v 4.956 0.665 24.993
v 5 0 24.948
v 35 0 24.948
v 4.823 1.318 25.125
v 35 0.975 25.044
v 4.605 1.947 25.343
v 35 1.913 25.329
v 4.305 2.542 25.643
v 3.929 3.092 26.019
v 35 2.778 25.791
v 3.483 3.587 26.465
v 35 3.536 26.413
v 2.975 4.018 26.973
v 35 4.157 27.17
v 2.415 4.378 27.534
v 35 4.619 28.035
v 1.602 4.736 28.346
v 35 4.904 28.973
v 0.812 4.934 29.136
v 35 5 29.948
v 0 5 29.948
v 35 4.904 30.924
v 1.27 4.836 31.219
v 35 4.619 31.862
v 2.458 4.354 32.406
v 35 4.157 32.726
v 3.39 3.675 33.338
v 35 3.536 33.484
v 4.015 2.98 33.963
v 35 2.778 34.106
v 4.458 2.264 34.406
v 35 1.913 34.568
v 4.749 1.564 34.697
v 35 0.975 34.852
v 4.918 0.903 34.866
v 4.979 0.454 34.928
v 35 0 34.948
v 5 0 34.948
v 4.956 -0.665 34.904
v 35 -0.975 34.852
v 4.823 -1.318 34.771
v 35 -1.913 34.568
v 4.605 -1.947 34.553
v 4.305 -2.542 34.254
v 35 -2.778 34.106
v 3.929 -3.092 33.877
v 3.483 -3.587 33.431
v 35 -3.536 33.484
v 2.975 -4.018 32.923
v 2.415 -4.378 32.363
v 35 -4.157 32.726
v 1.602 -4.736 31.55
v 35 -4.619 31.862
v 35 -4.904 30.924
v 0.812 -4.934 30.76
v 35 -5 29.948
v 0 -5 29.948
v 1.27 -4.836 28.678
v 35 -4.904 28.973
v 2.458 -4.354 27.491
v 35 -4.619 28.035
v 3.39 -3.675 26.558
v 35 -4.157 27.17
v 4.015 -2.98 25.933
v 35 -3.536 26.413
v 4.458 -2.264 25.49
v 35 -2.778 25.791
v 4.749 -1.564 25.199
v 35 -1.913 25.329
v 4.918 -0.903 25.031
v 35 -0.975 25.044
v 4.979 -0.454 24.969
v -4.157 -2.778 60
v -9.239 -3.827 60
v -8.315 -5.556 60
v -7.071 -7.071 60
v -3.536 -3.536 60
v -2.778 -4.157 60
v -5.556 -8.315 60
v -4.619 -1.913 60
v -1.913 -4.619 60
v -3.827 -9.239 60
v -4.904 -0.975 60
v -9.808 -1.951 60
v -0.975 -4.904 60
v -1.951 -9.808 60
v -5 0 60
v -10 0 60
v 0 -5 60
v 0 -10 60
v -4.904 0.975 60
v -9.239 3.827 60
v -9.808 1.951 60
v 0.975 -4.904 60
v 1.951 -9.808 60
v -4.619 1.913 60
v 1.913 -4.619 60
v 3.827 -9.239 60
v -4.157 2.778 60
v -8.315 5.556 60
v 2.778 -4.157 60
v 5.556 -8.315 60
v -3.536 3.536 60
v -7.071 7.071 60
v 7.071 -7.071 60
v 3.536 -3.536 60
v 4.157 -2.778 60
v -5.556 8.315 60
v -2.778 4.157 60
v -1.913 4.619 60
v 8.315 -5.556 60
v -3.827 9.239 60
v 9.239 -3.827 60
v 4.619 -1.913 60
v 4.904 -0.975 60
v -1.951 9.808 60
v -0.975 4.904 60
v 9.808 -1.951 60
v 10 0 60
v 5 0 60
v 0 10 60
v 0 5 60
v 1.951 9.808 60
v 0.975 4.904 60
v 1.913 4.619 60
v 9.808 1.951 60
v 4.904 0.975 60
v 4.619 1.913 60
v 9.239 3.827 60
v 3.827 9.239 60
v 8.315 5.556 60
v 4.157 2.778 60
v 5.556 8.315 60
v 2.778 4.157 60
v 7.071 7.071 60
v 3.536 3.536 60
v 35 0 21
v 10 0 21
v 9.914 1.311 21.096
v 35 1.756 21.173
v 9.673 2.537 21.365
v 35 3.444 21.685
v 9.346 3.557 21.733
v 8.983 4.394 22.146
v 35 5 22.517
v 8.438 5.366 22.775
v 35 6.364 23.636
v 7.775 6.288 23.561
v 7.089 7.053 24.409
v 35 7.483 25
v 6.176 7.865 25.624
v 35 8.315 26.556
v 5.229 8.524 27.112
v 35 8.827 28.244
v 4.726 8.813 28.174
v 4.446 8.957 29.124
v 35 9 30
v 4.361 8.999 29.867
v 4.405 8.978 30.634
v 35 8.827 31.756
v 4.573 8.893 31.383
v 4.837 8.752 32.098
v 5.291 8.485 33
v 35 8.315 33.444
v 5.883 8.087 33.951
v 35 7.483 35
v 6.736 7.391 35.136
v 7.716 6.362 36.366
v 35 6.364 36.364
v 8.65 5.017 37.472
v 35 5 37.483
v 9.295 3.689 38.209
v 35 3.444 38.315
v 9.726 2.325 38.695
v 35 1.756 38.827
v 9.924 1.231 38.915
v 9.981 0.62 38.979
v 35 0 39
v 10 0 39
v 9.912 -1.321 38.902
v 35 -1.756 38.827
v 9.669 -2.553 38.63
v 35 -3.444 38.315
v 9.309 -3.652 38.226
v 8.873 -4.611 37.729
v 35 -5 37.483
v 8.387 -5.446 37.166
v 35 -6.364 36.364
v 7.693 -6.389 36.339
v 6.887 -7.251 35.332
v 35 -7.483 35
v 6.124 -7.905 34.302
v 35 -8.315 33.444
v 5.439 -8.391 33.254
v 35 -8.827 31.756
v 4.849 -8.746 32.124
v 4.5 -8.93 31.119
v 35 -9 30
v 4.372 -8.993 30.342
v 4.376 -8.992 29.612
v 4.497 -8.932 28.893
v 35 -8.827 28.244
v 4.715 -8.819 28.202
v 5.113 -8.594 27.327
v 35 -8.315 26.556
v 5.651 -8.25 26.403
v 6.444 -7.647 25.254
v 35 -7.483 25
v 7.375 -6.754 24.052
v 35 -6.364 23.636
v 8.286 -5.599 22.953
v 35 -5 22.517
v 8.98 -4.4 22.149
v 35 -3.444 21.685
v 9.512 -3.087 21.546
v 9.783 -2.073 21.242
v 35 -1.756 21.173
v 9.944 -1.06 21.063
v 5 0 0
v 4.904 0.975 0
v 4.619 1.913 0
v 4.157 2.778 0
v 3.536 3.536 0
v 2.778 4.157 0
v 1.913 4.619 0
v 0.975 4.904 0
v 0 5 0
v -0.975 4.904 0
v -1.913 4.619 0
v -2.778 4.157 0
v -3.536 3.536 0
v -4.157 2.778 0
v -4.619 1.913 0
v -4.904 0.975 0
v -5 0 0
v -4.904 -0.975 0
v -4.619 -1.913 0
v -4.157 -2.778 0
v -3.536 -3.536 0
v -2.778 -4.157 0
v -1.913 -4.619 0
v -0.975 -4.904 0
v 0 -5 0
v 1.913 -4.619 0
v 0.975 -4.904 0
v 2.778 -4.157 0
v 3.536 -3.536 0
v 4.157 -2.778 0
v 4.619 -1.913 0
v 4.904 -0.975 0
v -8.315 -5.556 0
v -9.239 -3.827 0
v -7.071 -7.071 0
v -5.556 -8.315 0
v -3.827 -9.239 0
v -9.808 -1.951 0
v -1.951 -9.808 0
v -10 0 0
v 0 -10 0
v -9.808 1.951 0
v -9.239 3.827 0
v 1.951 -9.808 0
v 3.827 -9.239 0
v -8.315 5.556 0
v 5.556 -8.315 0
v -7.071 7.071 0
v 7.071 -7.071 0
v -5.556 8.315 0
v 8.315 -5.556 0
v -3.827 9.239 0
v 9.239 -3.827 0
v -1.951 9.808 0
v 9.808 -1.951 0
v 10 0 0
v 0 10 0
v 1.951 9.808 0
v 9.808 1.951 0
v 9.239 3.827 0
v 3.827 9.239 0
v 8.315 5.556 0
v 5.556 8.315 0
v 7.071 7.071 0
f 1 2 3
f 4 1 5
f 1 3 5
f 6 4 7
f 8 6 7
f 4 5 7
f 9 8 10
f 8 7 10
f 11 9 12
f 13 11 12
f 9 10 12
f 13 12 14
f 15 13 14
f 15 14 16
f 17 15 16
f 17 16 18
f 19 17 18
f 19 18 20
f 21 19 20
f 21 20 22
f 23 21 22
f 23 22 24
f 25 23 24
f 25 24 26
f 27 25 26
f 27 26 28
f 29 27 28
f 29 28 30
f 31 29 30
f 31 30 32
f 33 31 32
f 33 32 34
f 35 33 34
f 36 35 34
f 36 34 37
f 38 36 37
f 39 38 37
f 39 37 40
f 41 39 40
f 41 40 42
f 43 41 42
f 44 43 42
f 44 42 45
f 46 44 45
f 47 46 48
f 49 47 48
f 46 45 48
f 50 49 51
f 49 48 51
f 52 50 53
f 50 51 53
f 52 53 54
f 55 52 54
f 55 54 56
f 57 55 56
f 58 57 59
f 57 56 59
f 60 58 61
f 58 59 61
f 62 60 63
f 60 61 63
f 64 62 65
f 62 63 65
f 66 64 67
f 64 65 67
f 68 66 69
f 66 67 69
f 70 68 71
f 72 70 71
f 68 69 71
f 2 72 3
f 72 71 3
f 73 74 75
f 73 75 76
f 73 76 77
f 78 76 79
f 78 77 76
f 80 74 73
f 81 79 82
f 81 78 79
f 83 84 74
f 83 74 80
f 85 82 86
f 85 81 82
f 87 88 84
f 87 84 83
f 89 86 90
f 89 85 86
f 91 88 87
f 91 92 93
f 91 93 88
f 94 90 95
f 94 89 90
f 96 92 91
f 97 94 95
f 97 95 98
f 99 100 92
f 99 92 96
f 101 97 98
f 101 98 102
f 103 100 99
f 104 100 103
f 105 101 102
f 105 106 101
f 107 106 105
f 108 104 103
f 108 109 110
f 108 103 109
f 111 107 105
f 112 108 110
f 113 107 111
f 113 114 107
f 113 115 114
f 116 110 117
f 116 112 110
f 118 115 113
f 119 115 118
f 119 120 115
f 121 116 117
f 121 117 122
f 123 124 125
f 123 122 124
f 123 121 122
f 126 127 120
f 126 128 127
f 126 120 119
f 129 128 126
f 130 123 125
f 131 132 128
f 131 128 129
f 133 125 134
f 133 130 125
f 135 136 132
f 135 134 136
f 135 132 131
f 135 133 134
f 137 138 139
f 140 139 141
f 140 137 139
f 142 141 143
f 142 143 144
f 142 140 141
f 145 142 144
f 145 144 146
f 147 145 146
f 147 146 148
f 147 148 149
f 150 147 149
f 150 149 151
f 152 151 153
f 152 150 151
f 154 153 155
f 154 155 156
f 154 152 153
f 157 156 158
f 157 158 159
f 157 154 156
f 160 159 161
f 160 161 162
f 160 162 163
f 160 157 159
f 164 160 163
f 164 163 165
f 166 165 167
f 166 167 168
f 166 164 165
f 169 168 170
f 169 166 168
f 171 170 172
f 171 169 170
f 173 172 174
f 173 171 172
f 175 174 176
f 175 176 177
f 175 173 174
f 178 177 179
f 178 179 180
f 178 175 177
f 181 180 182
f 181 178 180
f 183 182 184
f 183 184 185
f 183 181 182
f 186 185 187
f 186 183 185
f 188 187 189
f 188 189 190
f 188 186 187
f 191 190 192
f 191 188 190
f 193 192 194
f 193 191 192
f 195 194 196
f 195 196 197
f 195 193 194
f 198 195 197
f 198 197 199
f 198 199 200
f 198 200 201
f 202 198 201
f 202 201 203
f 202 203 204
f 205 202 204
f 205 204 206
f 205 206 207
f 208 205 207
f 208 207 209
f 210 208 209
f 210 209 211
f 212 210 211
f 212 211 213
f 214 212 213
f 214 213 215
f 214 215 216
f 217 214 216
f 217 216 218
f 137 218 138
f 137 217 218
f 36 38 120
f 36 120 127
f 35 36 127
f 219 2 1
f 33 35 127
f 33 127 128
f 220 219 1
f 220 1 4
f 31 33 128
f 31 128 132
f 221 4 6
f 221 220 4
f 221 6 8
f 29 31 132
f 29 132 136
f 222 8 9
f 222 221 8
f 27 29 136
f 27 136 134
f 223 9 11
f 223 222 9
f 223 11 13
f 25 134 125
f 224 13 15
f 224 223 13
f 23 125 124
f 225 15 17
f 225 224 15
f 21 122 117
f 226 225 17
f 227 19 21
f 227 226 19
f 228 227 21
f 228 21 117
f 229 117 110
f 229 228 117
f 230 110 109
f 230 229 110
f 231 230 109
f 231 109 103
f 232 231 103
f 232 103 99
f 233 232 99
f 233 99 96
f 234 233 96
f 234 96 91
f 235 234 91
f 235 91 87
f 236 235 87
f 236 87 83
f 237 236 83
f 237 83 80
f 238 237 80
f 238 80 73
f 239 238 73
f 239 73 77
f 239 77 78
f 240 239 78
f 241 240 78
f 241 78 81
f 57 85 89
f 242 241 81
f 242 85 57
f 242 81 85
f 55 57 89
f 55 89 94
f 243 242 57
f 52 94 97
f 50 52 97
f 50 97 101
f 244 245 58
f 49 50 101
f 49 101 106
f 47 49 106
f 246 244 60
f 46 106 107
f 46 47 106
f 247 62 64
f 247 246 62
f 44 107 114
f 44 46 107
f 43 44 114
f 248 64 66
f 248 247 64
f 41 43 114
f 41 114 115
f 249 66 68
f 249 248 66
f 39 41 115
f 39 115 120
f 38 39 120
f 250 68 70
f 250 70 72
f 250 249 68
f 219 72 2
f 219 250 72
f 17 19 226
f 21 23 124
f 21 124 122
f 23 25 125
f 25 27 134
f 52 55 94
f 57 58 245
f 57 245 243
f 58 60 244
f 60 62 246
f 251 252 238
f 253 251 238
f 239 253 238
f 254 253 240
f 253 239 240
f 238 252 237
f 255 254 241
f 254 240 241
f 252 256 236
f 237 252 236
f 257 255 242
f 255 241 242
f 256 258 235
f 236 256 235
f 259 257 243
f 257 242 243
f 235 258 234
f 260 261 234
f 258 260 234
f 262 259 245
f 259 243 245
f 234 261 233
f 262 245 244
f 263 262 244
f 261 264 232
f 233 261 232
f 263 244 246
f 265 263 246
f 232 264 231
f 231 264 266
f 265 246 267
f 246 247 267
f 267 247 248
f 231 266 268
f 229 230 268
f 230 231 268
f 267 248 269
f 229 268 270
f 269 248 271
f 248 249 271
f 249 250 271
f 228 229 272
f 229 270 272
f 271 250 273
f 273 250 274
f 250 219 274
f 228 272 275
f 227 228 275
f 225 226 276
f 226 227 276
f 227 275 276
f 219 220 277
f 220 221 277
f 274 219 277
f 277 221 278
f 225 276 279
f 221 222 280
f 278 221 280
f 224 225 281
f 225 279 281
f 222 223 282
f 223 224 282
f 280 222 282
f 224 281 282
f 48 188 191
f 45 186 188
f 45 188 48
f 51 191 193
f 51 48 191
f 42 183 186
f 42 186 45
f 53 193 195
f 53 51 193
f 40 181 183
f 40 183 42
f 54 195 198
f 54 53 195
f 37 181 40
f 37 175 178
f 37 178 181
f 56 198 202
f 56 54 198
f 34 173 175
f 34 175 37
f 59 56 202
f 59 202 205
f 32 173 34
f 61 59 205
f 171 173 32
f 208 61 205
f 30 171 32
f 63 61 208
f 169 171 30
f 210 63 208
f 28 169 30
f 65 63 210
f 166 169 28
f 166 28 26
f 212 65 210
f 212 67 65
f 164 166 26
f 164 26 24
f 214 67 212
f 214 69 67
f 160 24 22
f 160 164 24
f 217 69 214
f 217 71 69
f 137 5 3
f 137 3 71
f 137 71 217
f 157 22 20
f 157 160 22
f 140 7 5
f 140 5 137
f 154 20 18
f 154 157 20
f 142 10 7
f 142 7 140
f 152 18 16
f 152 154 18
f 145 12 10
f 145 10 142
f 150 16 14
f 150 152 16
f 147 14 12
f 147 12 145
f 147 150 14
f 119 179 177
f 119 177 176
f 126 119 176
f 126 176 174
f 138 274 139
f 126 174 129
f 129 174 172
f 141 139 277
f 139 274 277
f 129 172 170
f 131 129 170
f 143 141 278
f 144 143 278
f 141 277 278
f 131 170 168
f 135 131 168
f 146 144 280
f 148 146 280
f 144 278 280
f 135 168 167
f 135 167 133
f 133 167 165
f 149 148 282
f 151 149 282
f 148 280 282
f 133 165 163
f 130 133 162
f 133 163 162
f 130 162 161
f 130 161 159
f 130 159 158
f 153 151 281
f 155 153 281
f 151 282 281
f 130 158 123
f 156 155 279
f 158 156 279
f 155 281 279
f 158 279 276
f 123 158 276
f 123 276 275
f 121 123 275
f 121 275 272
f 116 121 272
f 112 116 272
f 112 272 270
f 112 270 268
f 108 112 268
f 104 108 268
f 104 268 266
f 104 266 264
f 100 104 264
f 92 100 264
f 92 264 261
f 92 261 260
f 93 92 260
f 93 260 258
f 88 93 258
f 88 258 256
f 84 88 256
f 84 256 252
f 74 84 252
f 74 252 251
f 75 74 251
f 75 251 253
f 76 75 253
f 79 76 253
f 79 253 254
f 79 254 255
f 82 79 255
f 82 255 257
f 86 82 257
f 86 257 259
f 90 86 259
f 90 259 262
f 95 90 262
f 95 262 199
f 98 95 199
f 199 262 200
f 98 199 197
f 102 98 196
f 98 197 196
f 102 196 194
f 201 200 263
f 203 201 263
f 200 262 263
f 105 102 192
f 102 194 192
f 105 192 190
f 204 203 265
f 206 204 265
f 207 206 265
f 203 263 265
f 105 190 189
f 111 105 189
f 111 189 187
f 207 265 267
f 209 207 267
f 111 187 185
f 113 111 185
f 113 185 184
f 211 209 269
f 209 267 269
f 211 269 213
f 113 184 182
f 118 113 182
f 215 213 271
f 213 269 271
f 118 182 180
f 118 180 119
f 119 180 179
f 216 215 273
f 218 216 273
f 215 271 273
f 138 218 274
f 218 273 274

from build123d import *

# Parameters (mm, degrees)
SKETCH1_R                = 10
SKETCH1_R_2              = 5
EXTRUDE_THIN1_DEPTH      = 60
BOSS_EXTRUDE2_REACH      = 77.664
BOSS_EXTRUDE2_END_RADIUS = 10
SKETCH2_R                = 9
CUT_EXTRUDE1_REACH       = 77.664
CUT_EXTRUDE1_END_RADIUS  = 5
SKETCH3_R                = 5


with BuildPart() as part:
    # Sketch1 → Extrude-Thin1 (new body)
    with BuildSketch(Plane.XY):
        Circle(SKETCH1_R)
        Circle(SKETCH1_R_2, mode=Mode.SUBTRACT)
    extrude(amount=EXTRUDE_THIN1_DEPTH)

    # Boss-Extrude2: up to this cylinder (the profile starts outside it)
    boss_extrude2_end = Plane(origin=(0, 0, 30), z_dir=(0, 0, -1)) * Cylinder(BOSS_EXTRUDE2_END_RADIUS, 176.328, mode=Mode.PRIVATE)
    # Sketch2 → Boss-Extrude2 (add, up to the surface)
    with BuildSketch(Plane(origin=(35, 0, 0), x_dir=(0, 0, -1), z_dir=(1, 0, 0)), mode=Mode.PRIVATE) as boss_extrude2_sk1:
        with Locations((-30, 0)):
            Circle(SKETCH2_R)
    boss_extrude2_tool1 = extrude(boss_extrude2_sk1.sketch, amount=-BOSS_EXTRUDE2_REACH, mode=Mode.PRIVATE) - boss_extrude2_end
    add(boss_extrude2_tool1.solids().sort_by_distance((35, 0, 30))[0])

    # Cut-Extrude1: up to this cylinder (the profile starts outside it)
    cut_extrude1_end = Plane(origin=(0, 0, 29.948253), z_dir=(0, 0, -1)) * Cylinder(CUT_EXTRUDE1_END_RADIUS, 166.328, mode=Mode.PRIVATE)
    # Sketch3 → Cut-Extrude1 (cut, up to the surface)
    with BuildSketch(Plane(origin=(35, 0, 0), x_dir=(0, 0, -1), z_dir=(1, 0, 0)), mode=Mode.PRIVATE) as cut_extrude1_sk1:
        with Locations((-29.948253287, 0)):
            Circle(SKETCH3_R)
    cut_extrude1_tool1 = extrude(cut_extrude1_sk1.sketch, amount=-CUT_EXTRUDE1_REACH, mode=Mode.PRIVATE) - cut_extrude1_end
    add(cut_extrude1_tool1.solids().sort_by_distance((35, 0, 29.948253))[0], mode=Mode.SUBTRACT)


solid = part.part
